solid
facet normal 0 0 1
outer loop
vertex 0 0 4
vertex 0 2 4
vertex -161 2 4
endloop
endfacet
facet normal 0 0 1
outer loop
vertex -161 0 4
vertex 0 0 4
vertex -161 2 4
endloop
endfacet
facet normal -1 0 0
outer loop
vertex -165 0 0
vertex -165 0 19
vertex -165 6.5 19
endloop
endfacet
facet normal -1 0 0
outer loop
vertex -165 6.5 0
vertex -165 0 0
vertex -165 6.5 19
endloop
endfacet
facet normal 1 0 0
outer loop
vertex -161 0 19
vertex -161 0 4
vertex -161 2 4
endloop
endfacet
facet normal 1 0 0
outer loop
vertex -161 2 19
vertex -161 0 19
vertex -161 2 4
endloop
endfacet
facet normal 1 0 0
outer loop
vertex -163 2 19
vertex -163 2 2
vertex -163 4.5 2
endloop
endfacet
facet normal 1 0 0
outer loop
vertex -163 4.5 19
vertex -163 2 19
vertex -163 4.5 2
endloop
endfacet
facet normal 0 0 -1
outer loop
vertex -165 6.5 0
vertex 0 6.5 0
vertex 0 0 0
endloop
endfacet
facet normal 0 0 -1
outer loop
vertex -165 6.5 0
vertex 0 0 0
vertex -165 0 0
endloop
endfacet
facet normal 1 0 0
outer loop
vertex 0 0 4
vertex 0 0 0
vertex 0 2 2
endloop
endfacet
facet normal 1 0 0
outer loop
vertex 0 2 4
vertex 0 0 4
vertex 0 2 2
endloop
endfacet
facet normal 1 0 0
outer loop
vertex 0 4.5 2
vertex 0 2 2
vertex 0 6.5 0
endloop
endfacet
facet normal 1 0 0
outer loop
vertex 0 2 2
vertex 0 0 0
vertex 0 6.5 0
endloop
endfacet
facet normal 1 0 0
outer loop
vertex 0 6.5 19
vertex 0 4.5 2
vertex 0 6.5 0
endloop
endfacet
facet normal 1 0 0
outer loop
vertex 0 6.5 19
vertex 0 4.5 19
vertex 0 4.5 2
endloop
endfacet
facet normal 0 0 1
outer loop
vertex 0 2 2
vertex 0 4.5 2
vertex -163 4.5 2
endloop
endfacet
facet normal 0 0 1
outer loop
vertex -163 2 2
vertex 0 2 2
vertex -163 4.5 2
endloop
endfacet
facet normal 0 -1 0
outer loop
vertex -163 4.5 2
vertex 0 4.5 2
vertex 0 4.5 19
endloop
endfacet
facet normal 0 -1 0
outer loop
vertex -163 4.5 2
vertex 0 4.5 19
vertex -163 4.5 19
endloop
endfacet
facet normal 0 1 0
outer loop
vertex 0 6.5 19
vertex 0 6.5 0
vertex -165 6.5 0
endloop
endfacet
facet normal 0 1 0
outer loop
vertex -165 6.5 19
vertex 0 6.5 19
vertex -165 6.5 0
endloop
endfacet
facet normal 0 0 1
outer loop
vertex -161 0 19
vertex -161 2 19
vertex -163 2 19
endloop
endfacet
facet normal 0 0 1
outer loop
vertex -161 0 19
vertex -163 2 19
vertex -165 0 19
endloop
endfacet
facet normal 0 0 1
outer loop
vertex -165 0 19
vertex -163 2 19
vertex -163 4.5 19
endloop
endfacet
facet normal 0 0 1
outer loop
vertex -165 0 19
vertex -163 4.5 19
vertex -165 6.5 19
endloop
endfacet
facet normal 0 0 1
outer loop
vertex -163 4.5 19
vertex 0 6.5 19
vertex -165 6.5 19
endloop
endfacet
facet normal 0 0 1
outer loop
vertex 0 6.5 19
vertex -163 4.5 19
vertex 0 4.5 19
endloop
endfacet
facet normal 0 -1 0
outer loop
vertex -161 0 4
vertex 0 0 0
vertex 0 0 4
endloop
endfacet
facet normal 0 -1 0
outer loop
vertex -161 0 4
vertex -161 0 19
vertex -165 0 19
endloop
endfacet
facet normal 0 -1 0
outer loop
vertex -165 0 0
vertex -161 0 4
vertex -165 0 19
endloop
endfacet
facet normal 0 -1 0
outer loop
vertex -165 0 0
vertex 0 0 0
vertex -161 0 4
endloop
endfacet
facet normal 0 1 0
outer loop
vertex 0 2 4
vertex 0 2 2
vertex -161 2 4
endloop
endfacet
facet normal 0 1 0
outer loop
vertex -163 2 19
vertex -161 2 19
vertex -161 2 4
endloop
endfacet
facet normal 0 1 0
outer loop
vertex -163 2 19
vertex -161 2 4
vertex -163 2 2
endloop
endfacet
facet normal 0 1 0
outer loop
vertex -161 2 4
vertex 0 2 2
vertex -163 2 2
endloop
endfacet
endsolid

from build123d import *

# Parameters (mm, degrees)
BOX002_W                       = 161
BOX002_H                       = 2
BOX002_DEPTH                   = 15
BOX001_W                       = 163
BOX001_H                       = 2.5
BOX001_DEPTH                   = 17
BOX_W                          = 165
BOX_H                          = 6.5
BOX_DEPTH                      = 19
PART_MIRRORING_PLACEMENT_ANGLE = 180


with BuildPart() as cube002:
    # Box002 → Box002 (new body)
    with BuildSketch(Plane.XY.offset(4)):
        with Locations((80.5, 1)):
            Rectangle(BOX002_W, BOX002_H)
    extrude(amount=BOX002_DEPTH)


with BuildPart() as cube001:
    # Box001 → Box001 (new body)
    with BuildSketch(Plane(origin=(0, 2, 2), x_dir=(1, 0, 0), z_dir=(0, 0, 1))):
        with Locations((81.5, 1.25)):
            Rectangle(BOX001_W, BOX001_H)
    extrude(amount=BOX001_DEPTH)


with BuildPart() as cut001:
    # Box → Box (new body)
    with BuildSketch(Plane.XY):
        with Locations((82.5, 3.25)):
            Rectangle(BOX_W, BOX_H)
    extrude(amount=BOX_DEPTH)

    # Cut: cut Cube001
    add(cube001.part, mode=Mode.SUBTRACT)

    # Cut001: cut Cube002
    add(cube002.part, mode=Mode.SUBTRACT)


with BuildPart() as part_mirroring:
    # Part__Mirroring: instance of Cut001
    add(cut001.part.mirror(Plane(origin=(0, 0, 0), x_dir=(0, 1, 0), z_dir=(0, 0, 1))))


with BuildPart() as part_mirroring_1:
    # Part__Mirroring placement: moved
    add(part_mirroring.part.rotate(Axis((0, 0, 0), (0, 1, 0)), PART_MIRRORING_PLACEMENT_ANGLE))


solid = part_mirroring_1.part
